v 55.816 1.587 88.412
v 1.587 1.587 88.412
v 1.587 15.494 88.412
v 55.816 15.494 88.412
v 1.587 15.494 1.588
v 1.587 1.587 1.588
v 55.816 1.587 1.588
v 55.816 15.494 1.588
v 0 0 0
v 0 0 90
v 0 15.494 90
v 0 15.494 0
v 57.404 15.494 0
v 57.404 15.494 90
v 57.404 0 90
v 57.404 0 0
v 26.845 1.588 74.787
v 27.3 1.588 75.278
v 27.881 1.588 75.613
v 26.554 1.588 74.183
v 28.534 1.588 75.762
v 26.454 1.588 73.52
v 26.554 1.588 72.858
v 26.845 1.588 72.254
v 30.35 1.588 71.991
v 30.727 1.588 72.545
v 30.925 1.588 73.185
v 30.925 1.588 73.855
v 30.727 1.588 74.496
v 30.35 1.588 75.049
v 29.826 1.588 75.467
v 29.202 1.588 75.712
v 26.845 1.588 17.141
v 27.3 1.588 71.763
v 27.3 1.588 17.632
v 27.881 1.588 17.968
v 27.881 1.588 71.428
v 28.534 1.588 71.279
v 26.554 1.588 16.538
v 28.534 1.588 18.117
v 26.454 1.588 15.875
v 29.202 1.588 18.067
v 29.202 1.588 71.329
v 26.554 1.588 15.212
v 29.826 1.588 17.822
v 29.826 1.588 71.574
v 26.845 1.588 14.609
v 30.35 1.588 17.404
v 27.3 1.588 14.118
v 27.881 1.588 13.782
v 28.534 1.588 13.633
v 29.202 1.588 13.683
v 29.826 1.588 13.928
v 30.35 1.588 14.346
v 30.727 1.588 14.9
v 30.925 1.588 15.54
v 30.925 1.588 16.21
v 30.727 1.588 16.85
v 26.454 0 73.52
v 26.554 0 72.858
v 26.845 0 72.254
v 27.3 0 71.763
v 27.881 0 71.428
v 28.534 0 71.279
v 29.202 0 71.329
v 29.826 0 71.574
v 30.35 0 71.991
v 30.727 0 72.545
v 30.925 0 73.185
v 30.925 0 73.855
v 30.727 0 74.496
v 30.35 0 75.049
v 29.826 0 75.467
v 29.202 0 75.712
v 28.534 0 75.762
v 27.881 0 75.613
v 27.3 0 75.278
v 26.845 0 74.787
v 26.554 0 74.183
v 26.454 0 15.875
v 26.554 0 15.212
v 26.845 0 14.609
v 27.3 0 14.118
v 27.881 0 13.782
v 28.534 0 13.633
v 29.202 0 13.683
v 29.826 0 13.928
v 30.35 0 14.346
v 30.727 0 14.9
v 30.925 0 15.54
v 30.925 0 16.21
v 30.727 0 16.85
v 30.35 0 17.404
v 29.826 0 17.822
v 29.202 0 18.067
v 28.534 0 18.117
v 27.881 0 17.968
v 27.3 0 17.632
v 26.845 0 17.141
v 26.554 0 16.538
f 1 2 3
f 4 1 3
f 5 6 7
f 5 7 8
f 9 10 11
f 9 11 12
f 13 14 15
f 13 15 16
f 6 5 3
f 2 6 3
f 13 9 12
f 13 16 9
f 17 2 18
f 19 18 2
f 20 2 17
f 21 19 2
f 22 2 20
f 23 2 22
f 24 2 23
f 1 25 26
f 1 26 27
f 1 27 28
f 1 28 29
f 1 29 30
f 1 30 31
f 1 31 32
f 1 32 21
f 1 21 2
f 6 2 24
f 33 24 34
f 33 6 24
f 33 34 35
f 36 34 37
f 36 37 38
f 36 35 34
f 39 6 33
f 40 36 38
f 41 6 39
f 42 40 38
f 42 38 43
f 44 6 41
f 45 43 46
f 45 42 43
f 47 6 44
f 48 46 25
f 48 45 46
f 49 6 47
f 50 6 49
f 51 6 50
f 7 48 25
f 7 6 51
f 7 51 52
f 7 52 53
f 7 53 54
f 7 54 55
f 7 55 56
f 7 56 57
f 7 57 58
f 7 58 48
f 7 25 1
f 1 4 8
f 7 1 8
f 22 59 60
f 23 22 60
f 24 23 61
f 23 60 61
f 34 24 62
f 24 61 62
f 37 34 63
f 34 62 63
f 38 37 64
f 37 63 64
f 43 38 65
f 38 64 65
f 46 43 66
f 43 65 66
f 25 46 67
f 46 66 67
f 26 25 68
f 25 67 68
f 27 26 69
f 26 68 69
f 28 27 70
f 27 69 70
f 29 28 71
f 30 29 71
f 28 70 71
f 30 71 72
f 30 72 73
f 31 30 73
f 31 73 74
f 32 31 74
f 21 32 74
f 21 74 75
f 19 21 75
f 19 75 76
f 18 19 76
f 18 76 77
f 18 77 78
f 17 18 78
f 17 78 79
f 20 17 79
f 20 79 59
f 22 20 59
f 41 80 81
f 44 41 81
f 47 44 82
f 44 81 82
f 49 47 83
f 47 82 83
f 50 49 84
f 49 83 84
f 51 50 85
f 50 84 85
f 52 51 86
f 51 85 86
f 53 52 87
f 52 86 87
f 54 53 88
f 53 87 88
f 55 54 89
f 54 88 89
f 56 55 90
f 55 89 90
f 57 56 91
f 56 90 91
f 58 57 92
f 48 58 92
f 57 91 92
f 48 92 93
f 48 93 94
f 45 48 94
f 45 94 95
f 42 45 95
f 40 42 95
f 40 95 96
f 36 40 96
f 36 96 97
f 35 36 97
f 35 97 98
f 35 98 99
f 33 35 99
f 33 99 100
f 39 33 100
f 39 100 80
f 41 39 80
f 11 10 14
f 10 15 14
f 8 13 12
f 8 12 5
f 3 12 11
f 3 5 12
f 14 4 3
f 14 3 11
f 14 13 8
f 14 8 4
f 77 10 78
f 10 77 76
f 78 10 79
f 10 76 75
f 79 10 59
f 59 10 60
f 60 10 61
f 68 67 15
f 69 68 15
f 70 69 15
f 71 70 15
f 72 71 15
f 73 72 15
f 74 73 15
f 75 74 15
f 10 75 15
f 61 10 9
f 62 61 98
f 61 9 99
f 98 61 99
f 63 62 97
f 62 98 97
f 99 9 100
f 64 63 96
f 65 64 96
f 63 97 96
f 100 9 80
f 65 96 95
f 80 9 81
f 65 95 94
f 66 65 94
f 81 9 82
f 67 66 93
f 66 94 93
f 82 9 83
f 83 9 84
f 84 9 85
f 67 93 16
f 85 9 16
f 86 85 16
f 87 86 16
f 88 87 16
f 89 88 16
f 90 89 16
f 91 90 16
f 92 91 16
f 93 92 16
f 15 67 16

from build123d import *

# Parameters (mm, degrees)
SKETCH1_W                 = 57.404
SKETCH1_H                 = 90
BOSS_EXTRUDE1_DEPTH       = 1.5875
SKETCH2_W                 = 90
SKETCH2_H                 = 13.9065
BOSS_EXTRUDE2_DEPTH       = 1.5875
SKETCH3_W                 = 1.5875
SKETCH3_H                 = 13.9065
BOSS_EXTRUDE3_DEPTH       = 54.229
SKETCH4_W                 = 90
SKETCH4_H                 = 15.494
BOSS_EXTRUDE4_DEPTH       = 1.5875
F_8_CLEARANCE_HOLE1_D     = 4.4958
F_8_CLEARANCE_HOLE1_DEPTH = 1.5875


with BuildPart() as part:
    # Sketch1 → Boss-Extrude1 (new body)
    with BuildSketch(Plane(origin=(0, 0, 0), x_dir=(1, 0, 0), z_dir=(0, 1, 0))):
        with Locations((28.702, -45)):
            Rectangle(SKETCH1_W, SKETCH1_H)
    extrude(amount=BOSS_EXTRUDE1_DEPTH)

    # Sketch2 → Boss-Extrude2 (add)
    with BuildSketch(Plane(origin=(57.404, 0, 0), x_dir=(0, 0, -1), z_dir=(1, 0, 0))):
        with Locations((-45, 8.54075)):
            Rectangle(SKETCH2_W, SKETCH2_H)
    extrude(amount=-BOSS_EXTRUDE2_DEPTH)

    # Sketch3 → Boss-Extrude3 (add)
    with BuildSketch(Plane.ZY.offset(-55.8165)):
        with Locations((0.79375, 8.54075)):
            Rectangle(SKETCH3_W, SKETCH3_H)
        with Locations((89.20625, 8.54075)):
            Rectangle(SKETCH3_W, SKETCH3_H)
    extrude(amount=BOSS_EXTRUDE3_DEPTH)

    # Sketch4 → Boss-Extrude4 (add)
    with BuildSketch(Plane.ZY.offset(-1.5875)):
        with Locations((45, 7.747)):
            Rectangle(SKETCH4_W, SKETCH4_H)
    extrude(amount=BOSS_EXTRUDE4_DEPTH)

    # #8 Clearance Hole1
    with Locations(Plane(origin=(0, 1.5875, 0), x_dir=(1, 0, 0), z_dir=(0, 1, 0))):
        with Locations((28.702, -73.5203), (28.702, -15.875)):
            Hole(F_8_CLEARANCE_HOLE1_D / 2, depth=F_8_CLEARANCE_HOLE1_DEPTH)


solid = part.part
